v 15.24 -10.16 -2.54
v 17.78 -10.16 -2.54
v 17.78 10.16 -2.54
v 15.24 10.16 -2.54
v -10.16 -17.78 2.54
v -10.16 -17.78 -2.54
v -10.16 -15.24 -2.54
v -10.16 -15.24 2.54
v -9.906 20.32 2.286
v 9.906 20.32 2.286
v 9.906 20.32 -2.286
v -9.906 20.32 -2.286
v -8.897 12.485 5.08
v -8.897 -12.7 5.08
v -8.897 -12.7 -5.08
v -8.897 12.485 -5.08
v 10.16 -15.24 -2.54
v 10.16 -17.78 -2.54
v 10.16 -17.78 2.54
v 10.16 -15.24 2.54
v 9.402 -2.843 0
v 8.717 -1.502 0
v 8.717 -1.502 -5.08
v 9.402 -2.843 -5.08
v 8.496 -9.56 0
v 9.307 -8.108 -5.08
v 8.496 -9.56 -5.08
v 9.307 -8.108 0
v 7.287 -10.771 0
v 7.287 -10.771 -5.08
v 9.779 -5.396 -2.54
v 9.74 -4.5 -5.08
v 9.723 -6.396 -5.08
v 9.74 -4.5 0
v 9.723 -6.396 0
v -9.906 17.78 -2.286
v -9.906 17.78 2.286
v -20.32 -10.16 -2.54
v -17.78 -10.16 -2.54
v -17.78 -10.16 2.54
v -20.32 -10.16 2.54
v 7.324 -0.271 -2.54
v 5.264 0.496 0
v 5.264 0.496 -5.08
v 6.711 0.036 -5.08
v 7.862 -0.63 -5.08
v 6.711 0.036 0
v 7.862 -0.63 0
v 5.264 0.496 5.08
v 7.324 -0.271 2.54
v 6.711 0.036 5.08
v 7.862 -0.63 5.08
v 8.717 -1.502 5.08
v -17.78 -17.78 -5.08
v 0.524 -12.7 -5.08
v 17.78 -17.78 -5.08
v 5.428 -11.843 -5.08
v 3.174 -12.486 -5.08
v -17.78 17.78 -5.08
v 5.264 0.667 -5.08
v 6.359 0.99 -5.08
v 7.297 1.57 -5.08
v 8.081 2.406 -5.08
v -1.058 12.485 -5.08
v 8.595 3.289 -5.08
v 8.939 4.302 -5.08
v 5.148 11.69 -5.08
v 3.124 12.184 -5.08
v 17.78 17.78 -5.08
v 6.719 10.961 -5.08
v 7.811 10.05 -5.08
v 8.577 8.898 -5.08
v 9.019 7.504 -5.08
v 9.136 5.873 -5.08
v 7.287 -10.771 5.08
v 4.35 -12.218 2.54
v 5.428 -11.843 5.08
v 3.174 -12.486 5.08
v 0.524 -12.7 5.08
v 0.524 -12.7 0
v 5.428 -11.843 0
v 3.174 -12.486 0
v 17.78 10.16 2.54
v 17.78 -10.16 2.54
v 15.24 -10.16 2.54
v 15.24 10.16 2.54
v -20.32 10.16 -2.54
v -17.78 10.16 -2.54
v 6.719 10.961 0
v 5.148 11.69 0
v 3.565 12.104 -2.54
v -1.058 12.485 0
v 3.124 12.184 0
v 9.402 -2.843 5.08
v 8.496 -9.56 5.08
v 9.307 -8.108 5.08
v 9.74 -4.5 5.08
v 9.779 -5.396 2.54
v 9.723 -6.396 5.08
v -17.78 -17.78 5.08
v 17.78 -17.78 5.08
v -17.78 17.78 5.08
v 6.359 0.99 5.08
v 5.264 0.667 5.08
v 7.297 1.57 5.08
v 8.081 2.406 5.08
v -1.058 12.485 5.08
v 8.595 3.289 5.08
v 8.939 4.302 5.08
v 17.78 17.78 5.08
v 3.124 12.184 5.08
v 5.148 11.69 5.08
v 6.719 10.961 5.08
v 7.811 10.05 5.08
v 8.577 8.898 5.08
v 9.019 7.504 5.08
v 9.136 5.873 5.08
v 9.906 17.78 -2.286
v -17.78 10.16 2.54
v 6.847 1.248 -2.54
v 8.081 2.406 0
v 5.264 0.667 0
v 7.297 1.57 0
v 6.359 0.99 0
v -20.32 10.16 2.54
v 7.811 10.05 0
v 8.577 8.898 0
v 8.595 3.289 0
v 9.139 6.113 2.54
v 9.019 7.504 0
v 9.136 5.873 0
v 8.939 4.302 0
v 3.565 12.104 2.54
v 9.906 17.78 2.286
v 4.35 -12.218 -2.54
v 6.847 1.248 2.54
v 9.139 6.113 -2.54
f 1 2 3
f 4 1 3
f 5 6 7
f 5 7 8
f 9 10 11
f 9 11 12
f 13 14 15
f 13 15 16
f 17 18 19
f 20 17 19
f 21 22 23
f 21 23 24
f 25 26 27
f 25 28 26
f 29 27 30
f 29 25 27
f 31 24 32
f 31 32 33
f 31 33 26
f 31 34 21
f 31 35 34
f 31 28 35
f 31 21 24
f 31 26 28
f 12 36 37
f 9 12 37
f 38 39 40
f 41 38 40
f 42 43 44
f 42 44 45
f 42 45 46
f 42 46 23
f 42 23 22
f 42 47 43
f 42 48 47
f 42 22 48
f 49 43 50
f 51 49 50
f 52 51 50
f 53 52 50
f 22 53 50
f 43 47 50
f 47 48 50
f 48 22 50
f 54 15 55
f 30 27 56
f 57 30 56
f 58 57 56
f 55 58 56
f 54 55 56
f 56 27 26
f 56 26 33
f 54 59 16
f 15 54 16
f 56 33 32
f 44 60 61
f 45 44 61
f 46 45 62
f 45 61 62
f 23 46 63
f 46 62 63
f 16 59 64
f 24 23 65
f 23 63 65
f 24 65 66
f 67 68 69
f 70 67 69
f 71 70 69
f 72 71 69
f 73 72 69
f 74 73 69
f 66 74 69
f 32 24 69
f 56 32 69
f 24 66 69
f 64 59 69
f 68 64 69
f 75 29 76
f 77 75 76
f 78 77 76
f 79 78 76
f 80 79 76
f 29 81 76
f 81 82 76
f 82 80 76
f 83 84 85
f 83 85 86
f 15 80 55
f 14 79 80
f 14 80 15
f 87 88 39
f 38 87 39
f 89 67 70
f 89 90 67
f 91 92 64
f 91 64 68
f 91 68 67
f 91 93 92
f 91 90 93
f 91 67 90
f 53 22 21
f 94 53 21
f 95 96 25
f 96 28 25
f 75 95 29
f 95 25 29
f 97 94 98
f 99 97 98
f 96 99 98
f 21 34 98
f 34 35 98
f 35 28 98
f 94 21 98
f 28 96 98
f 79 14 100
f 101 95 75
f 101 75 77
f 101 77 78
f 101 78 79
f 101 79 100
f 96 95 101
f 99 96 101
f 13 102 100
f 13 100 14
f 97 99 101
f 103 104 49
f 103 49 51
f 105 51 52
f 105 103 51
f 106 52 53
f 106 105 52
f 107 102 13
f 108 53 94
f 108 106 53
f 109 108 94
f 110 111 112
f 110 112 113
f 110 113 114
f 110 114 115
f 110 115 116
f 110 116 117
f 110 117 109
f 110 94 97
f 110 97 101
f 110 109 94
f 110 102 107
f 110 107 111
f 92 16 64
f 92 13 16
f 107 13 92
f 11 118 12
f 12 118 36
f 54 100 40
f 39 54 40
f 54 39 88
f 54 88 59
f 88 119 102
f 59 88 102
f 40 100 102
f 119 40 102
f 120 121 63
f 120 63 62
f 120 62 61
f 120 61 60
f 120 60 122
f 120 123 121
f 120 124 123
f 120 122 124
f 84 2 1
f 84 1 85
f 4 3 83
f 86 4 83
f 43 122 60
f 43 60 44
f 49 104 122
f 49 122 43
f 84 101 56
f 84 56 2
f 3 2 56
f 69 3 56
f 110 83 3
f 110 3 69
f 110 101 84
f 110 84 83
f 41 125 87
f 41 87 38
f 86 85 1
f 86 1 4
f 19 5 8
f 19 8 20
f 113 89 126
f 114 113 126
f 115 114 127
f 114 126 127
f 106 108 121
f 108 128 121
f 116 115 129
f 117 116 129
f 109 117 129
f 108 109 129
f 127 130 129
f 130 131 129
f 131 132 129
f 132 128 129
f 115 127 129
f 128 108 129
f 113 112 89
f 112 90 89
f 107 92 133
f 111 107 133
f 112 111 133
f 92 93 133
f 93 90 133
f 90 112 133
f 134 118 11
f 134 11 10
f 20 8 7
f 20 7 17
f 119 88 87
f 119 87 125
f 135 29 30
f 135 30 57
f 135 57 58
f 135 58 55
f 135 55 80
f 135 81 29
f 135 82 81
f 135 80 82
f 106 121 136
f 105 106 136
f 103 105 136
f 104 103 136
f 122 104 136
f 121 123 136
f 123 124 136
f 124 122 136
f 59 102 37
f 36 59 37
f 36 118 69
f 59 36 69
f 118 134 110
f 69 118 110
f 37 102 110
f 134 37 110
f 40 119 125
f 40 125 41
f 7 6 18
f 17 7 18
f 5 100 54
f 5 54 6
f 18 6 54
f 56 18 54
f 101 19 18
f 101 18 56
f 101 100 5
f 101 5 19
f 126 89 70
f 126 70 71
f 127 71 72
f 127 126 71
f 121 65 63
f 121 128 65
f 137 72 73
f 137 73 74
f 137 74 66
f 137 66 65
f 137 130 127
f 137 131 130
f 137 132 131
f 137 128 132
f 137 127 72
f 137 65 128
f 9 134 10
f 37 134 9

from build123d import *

# Parameters (mm, degrees)
F0_W     = 35.56
F0_H     = 35.56
F1_DEPTH = 5.08
F2_W     = 19.812
F2_H     = 4.572
F3_DEPTH = 2.54
F4_W     = 20.32
F4_H     = 5.08
F5_DEPTH = 2.54
F6_W     = 20.32
F6_H     = 5.08
F7_DEPTH = 2.54
F8_W     = 20.32
F8_H     = 5.08
F9_DEPTH = 2.54


with BuildPart() as f1:
    # F0 (on Top) → F1 (new body, symmetric)
    with BuildSketch(Plane.XY):
        Rectangle(F0_W, F0_H)
        with BuildLine():
            Line((-8.8966145833, -12.7), (-8.8966145833, 12.4850260417))
            Line((-8.8966145833, 12.4850260417), (-1.0583333333, 12.4850260417))
            add(Edge.make_bspline(
                [(-1.0583333333, 12.4850260417), (4.2994791667, 12.4850260417), (6.7193142361, 10.9609157986)],
                knots=[0, 0, 0, 1, 1, 1], degree=2))
            add(Edge.make_bspline(
                [(6.7193142361, 10.9609157986), (9.1391493056, 9.4368055556), (9.1391493056, 6.1129774306)],
                knots=[0, 0, 0, 1, 1, 1], degree=2))
            add(Edge.make_bspline(
                [(9.1391493056, 6.1129774306), (9.1391493056, 3.8529947917), (8.0808159722, 2.4060546875)],
                knots=[0, 0, 0, 1, 1, 1], degree=2))
            add(Edge.make_bspline(
                [(8.0808159722, 2.4060546875), (7.0224826389, 0.9591145833), (5.2641059028, 0.6669704861)],
                knots=[0, 0, 0, 1, 1, 1], degree=2))
            Line((5.2641059028, 0.6669704861), (5.2641059028, 0.49609375))
            add(Edge.make_bspline(
                [(5.2641059028, 0.49609375), (7.6563802083, -0.0385850694), (8.7174696181, -1.5020616319)],
                knots=[0, 0, 0, 1, 1, 1], degree=2))
            add(Edge.make_bspline(
                [(8.7174696181, -1.5020616319), (9.7785590278, -2.9655381944), (9.7785590278, -5.3963975694)],
                knots=[0, 0, 0, 1, 1, 1], degree=2))
            add(Edge.make_bspline(
                [(9.7785590278, -5.3963975694), (9.7785590278, -8.8414930556), (7.2870659722, -10.7707465278)],
                knots=[0, 0, 0, 1, 1, 1], degree=2))
            add(Edge.make_bspline(
                [(7.2870659722, -10.7707465278), (4.7955729167, -12.7), (0.5236545139, -12.7)],
                knots=[0, 0, 0, 1, 1, 1], degree=2))
            Line((0.5236545139, -12.7), (-8.8966145833, -12.7))
        make_face(mode=Mode.SUBTRACT)
    extrude(amount=F1_DEPTH, both=True)

    # F2 (on face) → F3 (join)
    with BuildSketch(Plane(origin=(0, 17.78, 0), x_dir=(-1, 0, 0), z_dir=(0, 1, 0))):
        Rectangle(F2_W, F2_H)
    extrude(amount=F3_DEPTH)

    # F4 (on face) → F5 (join)
    with BuildSketch(Plane(origin=(-17.78, 0, 0), x_dir=(0, -1, 0), z_dir=(-1, 0, 0))):
        Rectangle(F4_W, F4_H)
    extrude(amount=F5_DEPTH)

    # F6 (on face) → F7 (cut)
    with BuildSketch(Plane.XZ.offset(17.78)):
        Rectangle(F6_W, F6_H)
    extrude(amount=-F7_DEPTH, mode=Mode.SUBTRACT)

    # F8 (on face) → F9 (cut)
    with BuildSketch(Plane.YZ.offset(17.78)):
        Rectangle(F8_W, F8_H)
    extrude(amount=-F9_DEPTH, mode=Mode.SUBTRACT)


solid = f1.part
